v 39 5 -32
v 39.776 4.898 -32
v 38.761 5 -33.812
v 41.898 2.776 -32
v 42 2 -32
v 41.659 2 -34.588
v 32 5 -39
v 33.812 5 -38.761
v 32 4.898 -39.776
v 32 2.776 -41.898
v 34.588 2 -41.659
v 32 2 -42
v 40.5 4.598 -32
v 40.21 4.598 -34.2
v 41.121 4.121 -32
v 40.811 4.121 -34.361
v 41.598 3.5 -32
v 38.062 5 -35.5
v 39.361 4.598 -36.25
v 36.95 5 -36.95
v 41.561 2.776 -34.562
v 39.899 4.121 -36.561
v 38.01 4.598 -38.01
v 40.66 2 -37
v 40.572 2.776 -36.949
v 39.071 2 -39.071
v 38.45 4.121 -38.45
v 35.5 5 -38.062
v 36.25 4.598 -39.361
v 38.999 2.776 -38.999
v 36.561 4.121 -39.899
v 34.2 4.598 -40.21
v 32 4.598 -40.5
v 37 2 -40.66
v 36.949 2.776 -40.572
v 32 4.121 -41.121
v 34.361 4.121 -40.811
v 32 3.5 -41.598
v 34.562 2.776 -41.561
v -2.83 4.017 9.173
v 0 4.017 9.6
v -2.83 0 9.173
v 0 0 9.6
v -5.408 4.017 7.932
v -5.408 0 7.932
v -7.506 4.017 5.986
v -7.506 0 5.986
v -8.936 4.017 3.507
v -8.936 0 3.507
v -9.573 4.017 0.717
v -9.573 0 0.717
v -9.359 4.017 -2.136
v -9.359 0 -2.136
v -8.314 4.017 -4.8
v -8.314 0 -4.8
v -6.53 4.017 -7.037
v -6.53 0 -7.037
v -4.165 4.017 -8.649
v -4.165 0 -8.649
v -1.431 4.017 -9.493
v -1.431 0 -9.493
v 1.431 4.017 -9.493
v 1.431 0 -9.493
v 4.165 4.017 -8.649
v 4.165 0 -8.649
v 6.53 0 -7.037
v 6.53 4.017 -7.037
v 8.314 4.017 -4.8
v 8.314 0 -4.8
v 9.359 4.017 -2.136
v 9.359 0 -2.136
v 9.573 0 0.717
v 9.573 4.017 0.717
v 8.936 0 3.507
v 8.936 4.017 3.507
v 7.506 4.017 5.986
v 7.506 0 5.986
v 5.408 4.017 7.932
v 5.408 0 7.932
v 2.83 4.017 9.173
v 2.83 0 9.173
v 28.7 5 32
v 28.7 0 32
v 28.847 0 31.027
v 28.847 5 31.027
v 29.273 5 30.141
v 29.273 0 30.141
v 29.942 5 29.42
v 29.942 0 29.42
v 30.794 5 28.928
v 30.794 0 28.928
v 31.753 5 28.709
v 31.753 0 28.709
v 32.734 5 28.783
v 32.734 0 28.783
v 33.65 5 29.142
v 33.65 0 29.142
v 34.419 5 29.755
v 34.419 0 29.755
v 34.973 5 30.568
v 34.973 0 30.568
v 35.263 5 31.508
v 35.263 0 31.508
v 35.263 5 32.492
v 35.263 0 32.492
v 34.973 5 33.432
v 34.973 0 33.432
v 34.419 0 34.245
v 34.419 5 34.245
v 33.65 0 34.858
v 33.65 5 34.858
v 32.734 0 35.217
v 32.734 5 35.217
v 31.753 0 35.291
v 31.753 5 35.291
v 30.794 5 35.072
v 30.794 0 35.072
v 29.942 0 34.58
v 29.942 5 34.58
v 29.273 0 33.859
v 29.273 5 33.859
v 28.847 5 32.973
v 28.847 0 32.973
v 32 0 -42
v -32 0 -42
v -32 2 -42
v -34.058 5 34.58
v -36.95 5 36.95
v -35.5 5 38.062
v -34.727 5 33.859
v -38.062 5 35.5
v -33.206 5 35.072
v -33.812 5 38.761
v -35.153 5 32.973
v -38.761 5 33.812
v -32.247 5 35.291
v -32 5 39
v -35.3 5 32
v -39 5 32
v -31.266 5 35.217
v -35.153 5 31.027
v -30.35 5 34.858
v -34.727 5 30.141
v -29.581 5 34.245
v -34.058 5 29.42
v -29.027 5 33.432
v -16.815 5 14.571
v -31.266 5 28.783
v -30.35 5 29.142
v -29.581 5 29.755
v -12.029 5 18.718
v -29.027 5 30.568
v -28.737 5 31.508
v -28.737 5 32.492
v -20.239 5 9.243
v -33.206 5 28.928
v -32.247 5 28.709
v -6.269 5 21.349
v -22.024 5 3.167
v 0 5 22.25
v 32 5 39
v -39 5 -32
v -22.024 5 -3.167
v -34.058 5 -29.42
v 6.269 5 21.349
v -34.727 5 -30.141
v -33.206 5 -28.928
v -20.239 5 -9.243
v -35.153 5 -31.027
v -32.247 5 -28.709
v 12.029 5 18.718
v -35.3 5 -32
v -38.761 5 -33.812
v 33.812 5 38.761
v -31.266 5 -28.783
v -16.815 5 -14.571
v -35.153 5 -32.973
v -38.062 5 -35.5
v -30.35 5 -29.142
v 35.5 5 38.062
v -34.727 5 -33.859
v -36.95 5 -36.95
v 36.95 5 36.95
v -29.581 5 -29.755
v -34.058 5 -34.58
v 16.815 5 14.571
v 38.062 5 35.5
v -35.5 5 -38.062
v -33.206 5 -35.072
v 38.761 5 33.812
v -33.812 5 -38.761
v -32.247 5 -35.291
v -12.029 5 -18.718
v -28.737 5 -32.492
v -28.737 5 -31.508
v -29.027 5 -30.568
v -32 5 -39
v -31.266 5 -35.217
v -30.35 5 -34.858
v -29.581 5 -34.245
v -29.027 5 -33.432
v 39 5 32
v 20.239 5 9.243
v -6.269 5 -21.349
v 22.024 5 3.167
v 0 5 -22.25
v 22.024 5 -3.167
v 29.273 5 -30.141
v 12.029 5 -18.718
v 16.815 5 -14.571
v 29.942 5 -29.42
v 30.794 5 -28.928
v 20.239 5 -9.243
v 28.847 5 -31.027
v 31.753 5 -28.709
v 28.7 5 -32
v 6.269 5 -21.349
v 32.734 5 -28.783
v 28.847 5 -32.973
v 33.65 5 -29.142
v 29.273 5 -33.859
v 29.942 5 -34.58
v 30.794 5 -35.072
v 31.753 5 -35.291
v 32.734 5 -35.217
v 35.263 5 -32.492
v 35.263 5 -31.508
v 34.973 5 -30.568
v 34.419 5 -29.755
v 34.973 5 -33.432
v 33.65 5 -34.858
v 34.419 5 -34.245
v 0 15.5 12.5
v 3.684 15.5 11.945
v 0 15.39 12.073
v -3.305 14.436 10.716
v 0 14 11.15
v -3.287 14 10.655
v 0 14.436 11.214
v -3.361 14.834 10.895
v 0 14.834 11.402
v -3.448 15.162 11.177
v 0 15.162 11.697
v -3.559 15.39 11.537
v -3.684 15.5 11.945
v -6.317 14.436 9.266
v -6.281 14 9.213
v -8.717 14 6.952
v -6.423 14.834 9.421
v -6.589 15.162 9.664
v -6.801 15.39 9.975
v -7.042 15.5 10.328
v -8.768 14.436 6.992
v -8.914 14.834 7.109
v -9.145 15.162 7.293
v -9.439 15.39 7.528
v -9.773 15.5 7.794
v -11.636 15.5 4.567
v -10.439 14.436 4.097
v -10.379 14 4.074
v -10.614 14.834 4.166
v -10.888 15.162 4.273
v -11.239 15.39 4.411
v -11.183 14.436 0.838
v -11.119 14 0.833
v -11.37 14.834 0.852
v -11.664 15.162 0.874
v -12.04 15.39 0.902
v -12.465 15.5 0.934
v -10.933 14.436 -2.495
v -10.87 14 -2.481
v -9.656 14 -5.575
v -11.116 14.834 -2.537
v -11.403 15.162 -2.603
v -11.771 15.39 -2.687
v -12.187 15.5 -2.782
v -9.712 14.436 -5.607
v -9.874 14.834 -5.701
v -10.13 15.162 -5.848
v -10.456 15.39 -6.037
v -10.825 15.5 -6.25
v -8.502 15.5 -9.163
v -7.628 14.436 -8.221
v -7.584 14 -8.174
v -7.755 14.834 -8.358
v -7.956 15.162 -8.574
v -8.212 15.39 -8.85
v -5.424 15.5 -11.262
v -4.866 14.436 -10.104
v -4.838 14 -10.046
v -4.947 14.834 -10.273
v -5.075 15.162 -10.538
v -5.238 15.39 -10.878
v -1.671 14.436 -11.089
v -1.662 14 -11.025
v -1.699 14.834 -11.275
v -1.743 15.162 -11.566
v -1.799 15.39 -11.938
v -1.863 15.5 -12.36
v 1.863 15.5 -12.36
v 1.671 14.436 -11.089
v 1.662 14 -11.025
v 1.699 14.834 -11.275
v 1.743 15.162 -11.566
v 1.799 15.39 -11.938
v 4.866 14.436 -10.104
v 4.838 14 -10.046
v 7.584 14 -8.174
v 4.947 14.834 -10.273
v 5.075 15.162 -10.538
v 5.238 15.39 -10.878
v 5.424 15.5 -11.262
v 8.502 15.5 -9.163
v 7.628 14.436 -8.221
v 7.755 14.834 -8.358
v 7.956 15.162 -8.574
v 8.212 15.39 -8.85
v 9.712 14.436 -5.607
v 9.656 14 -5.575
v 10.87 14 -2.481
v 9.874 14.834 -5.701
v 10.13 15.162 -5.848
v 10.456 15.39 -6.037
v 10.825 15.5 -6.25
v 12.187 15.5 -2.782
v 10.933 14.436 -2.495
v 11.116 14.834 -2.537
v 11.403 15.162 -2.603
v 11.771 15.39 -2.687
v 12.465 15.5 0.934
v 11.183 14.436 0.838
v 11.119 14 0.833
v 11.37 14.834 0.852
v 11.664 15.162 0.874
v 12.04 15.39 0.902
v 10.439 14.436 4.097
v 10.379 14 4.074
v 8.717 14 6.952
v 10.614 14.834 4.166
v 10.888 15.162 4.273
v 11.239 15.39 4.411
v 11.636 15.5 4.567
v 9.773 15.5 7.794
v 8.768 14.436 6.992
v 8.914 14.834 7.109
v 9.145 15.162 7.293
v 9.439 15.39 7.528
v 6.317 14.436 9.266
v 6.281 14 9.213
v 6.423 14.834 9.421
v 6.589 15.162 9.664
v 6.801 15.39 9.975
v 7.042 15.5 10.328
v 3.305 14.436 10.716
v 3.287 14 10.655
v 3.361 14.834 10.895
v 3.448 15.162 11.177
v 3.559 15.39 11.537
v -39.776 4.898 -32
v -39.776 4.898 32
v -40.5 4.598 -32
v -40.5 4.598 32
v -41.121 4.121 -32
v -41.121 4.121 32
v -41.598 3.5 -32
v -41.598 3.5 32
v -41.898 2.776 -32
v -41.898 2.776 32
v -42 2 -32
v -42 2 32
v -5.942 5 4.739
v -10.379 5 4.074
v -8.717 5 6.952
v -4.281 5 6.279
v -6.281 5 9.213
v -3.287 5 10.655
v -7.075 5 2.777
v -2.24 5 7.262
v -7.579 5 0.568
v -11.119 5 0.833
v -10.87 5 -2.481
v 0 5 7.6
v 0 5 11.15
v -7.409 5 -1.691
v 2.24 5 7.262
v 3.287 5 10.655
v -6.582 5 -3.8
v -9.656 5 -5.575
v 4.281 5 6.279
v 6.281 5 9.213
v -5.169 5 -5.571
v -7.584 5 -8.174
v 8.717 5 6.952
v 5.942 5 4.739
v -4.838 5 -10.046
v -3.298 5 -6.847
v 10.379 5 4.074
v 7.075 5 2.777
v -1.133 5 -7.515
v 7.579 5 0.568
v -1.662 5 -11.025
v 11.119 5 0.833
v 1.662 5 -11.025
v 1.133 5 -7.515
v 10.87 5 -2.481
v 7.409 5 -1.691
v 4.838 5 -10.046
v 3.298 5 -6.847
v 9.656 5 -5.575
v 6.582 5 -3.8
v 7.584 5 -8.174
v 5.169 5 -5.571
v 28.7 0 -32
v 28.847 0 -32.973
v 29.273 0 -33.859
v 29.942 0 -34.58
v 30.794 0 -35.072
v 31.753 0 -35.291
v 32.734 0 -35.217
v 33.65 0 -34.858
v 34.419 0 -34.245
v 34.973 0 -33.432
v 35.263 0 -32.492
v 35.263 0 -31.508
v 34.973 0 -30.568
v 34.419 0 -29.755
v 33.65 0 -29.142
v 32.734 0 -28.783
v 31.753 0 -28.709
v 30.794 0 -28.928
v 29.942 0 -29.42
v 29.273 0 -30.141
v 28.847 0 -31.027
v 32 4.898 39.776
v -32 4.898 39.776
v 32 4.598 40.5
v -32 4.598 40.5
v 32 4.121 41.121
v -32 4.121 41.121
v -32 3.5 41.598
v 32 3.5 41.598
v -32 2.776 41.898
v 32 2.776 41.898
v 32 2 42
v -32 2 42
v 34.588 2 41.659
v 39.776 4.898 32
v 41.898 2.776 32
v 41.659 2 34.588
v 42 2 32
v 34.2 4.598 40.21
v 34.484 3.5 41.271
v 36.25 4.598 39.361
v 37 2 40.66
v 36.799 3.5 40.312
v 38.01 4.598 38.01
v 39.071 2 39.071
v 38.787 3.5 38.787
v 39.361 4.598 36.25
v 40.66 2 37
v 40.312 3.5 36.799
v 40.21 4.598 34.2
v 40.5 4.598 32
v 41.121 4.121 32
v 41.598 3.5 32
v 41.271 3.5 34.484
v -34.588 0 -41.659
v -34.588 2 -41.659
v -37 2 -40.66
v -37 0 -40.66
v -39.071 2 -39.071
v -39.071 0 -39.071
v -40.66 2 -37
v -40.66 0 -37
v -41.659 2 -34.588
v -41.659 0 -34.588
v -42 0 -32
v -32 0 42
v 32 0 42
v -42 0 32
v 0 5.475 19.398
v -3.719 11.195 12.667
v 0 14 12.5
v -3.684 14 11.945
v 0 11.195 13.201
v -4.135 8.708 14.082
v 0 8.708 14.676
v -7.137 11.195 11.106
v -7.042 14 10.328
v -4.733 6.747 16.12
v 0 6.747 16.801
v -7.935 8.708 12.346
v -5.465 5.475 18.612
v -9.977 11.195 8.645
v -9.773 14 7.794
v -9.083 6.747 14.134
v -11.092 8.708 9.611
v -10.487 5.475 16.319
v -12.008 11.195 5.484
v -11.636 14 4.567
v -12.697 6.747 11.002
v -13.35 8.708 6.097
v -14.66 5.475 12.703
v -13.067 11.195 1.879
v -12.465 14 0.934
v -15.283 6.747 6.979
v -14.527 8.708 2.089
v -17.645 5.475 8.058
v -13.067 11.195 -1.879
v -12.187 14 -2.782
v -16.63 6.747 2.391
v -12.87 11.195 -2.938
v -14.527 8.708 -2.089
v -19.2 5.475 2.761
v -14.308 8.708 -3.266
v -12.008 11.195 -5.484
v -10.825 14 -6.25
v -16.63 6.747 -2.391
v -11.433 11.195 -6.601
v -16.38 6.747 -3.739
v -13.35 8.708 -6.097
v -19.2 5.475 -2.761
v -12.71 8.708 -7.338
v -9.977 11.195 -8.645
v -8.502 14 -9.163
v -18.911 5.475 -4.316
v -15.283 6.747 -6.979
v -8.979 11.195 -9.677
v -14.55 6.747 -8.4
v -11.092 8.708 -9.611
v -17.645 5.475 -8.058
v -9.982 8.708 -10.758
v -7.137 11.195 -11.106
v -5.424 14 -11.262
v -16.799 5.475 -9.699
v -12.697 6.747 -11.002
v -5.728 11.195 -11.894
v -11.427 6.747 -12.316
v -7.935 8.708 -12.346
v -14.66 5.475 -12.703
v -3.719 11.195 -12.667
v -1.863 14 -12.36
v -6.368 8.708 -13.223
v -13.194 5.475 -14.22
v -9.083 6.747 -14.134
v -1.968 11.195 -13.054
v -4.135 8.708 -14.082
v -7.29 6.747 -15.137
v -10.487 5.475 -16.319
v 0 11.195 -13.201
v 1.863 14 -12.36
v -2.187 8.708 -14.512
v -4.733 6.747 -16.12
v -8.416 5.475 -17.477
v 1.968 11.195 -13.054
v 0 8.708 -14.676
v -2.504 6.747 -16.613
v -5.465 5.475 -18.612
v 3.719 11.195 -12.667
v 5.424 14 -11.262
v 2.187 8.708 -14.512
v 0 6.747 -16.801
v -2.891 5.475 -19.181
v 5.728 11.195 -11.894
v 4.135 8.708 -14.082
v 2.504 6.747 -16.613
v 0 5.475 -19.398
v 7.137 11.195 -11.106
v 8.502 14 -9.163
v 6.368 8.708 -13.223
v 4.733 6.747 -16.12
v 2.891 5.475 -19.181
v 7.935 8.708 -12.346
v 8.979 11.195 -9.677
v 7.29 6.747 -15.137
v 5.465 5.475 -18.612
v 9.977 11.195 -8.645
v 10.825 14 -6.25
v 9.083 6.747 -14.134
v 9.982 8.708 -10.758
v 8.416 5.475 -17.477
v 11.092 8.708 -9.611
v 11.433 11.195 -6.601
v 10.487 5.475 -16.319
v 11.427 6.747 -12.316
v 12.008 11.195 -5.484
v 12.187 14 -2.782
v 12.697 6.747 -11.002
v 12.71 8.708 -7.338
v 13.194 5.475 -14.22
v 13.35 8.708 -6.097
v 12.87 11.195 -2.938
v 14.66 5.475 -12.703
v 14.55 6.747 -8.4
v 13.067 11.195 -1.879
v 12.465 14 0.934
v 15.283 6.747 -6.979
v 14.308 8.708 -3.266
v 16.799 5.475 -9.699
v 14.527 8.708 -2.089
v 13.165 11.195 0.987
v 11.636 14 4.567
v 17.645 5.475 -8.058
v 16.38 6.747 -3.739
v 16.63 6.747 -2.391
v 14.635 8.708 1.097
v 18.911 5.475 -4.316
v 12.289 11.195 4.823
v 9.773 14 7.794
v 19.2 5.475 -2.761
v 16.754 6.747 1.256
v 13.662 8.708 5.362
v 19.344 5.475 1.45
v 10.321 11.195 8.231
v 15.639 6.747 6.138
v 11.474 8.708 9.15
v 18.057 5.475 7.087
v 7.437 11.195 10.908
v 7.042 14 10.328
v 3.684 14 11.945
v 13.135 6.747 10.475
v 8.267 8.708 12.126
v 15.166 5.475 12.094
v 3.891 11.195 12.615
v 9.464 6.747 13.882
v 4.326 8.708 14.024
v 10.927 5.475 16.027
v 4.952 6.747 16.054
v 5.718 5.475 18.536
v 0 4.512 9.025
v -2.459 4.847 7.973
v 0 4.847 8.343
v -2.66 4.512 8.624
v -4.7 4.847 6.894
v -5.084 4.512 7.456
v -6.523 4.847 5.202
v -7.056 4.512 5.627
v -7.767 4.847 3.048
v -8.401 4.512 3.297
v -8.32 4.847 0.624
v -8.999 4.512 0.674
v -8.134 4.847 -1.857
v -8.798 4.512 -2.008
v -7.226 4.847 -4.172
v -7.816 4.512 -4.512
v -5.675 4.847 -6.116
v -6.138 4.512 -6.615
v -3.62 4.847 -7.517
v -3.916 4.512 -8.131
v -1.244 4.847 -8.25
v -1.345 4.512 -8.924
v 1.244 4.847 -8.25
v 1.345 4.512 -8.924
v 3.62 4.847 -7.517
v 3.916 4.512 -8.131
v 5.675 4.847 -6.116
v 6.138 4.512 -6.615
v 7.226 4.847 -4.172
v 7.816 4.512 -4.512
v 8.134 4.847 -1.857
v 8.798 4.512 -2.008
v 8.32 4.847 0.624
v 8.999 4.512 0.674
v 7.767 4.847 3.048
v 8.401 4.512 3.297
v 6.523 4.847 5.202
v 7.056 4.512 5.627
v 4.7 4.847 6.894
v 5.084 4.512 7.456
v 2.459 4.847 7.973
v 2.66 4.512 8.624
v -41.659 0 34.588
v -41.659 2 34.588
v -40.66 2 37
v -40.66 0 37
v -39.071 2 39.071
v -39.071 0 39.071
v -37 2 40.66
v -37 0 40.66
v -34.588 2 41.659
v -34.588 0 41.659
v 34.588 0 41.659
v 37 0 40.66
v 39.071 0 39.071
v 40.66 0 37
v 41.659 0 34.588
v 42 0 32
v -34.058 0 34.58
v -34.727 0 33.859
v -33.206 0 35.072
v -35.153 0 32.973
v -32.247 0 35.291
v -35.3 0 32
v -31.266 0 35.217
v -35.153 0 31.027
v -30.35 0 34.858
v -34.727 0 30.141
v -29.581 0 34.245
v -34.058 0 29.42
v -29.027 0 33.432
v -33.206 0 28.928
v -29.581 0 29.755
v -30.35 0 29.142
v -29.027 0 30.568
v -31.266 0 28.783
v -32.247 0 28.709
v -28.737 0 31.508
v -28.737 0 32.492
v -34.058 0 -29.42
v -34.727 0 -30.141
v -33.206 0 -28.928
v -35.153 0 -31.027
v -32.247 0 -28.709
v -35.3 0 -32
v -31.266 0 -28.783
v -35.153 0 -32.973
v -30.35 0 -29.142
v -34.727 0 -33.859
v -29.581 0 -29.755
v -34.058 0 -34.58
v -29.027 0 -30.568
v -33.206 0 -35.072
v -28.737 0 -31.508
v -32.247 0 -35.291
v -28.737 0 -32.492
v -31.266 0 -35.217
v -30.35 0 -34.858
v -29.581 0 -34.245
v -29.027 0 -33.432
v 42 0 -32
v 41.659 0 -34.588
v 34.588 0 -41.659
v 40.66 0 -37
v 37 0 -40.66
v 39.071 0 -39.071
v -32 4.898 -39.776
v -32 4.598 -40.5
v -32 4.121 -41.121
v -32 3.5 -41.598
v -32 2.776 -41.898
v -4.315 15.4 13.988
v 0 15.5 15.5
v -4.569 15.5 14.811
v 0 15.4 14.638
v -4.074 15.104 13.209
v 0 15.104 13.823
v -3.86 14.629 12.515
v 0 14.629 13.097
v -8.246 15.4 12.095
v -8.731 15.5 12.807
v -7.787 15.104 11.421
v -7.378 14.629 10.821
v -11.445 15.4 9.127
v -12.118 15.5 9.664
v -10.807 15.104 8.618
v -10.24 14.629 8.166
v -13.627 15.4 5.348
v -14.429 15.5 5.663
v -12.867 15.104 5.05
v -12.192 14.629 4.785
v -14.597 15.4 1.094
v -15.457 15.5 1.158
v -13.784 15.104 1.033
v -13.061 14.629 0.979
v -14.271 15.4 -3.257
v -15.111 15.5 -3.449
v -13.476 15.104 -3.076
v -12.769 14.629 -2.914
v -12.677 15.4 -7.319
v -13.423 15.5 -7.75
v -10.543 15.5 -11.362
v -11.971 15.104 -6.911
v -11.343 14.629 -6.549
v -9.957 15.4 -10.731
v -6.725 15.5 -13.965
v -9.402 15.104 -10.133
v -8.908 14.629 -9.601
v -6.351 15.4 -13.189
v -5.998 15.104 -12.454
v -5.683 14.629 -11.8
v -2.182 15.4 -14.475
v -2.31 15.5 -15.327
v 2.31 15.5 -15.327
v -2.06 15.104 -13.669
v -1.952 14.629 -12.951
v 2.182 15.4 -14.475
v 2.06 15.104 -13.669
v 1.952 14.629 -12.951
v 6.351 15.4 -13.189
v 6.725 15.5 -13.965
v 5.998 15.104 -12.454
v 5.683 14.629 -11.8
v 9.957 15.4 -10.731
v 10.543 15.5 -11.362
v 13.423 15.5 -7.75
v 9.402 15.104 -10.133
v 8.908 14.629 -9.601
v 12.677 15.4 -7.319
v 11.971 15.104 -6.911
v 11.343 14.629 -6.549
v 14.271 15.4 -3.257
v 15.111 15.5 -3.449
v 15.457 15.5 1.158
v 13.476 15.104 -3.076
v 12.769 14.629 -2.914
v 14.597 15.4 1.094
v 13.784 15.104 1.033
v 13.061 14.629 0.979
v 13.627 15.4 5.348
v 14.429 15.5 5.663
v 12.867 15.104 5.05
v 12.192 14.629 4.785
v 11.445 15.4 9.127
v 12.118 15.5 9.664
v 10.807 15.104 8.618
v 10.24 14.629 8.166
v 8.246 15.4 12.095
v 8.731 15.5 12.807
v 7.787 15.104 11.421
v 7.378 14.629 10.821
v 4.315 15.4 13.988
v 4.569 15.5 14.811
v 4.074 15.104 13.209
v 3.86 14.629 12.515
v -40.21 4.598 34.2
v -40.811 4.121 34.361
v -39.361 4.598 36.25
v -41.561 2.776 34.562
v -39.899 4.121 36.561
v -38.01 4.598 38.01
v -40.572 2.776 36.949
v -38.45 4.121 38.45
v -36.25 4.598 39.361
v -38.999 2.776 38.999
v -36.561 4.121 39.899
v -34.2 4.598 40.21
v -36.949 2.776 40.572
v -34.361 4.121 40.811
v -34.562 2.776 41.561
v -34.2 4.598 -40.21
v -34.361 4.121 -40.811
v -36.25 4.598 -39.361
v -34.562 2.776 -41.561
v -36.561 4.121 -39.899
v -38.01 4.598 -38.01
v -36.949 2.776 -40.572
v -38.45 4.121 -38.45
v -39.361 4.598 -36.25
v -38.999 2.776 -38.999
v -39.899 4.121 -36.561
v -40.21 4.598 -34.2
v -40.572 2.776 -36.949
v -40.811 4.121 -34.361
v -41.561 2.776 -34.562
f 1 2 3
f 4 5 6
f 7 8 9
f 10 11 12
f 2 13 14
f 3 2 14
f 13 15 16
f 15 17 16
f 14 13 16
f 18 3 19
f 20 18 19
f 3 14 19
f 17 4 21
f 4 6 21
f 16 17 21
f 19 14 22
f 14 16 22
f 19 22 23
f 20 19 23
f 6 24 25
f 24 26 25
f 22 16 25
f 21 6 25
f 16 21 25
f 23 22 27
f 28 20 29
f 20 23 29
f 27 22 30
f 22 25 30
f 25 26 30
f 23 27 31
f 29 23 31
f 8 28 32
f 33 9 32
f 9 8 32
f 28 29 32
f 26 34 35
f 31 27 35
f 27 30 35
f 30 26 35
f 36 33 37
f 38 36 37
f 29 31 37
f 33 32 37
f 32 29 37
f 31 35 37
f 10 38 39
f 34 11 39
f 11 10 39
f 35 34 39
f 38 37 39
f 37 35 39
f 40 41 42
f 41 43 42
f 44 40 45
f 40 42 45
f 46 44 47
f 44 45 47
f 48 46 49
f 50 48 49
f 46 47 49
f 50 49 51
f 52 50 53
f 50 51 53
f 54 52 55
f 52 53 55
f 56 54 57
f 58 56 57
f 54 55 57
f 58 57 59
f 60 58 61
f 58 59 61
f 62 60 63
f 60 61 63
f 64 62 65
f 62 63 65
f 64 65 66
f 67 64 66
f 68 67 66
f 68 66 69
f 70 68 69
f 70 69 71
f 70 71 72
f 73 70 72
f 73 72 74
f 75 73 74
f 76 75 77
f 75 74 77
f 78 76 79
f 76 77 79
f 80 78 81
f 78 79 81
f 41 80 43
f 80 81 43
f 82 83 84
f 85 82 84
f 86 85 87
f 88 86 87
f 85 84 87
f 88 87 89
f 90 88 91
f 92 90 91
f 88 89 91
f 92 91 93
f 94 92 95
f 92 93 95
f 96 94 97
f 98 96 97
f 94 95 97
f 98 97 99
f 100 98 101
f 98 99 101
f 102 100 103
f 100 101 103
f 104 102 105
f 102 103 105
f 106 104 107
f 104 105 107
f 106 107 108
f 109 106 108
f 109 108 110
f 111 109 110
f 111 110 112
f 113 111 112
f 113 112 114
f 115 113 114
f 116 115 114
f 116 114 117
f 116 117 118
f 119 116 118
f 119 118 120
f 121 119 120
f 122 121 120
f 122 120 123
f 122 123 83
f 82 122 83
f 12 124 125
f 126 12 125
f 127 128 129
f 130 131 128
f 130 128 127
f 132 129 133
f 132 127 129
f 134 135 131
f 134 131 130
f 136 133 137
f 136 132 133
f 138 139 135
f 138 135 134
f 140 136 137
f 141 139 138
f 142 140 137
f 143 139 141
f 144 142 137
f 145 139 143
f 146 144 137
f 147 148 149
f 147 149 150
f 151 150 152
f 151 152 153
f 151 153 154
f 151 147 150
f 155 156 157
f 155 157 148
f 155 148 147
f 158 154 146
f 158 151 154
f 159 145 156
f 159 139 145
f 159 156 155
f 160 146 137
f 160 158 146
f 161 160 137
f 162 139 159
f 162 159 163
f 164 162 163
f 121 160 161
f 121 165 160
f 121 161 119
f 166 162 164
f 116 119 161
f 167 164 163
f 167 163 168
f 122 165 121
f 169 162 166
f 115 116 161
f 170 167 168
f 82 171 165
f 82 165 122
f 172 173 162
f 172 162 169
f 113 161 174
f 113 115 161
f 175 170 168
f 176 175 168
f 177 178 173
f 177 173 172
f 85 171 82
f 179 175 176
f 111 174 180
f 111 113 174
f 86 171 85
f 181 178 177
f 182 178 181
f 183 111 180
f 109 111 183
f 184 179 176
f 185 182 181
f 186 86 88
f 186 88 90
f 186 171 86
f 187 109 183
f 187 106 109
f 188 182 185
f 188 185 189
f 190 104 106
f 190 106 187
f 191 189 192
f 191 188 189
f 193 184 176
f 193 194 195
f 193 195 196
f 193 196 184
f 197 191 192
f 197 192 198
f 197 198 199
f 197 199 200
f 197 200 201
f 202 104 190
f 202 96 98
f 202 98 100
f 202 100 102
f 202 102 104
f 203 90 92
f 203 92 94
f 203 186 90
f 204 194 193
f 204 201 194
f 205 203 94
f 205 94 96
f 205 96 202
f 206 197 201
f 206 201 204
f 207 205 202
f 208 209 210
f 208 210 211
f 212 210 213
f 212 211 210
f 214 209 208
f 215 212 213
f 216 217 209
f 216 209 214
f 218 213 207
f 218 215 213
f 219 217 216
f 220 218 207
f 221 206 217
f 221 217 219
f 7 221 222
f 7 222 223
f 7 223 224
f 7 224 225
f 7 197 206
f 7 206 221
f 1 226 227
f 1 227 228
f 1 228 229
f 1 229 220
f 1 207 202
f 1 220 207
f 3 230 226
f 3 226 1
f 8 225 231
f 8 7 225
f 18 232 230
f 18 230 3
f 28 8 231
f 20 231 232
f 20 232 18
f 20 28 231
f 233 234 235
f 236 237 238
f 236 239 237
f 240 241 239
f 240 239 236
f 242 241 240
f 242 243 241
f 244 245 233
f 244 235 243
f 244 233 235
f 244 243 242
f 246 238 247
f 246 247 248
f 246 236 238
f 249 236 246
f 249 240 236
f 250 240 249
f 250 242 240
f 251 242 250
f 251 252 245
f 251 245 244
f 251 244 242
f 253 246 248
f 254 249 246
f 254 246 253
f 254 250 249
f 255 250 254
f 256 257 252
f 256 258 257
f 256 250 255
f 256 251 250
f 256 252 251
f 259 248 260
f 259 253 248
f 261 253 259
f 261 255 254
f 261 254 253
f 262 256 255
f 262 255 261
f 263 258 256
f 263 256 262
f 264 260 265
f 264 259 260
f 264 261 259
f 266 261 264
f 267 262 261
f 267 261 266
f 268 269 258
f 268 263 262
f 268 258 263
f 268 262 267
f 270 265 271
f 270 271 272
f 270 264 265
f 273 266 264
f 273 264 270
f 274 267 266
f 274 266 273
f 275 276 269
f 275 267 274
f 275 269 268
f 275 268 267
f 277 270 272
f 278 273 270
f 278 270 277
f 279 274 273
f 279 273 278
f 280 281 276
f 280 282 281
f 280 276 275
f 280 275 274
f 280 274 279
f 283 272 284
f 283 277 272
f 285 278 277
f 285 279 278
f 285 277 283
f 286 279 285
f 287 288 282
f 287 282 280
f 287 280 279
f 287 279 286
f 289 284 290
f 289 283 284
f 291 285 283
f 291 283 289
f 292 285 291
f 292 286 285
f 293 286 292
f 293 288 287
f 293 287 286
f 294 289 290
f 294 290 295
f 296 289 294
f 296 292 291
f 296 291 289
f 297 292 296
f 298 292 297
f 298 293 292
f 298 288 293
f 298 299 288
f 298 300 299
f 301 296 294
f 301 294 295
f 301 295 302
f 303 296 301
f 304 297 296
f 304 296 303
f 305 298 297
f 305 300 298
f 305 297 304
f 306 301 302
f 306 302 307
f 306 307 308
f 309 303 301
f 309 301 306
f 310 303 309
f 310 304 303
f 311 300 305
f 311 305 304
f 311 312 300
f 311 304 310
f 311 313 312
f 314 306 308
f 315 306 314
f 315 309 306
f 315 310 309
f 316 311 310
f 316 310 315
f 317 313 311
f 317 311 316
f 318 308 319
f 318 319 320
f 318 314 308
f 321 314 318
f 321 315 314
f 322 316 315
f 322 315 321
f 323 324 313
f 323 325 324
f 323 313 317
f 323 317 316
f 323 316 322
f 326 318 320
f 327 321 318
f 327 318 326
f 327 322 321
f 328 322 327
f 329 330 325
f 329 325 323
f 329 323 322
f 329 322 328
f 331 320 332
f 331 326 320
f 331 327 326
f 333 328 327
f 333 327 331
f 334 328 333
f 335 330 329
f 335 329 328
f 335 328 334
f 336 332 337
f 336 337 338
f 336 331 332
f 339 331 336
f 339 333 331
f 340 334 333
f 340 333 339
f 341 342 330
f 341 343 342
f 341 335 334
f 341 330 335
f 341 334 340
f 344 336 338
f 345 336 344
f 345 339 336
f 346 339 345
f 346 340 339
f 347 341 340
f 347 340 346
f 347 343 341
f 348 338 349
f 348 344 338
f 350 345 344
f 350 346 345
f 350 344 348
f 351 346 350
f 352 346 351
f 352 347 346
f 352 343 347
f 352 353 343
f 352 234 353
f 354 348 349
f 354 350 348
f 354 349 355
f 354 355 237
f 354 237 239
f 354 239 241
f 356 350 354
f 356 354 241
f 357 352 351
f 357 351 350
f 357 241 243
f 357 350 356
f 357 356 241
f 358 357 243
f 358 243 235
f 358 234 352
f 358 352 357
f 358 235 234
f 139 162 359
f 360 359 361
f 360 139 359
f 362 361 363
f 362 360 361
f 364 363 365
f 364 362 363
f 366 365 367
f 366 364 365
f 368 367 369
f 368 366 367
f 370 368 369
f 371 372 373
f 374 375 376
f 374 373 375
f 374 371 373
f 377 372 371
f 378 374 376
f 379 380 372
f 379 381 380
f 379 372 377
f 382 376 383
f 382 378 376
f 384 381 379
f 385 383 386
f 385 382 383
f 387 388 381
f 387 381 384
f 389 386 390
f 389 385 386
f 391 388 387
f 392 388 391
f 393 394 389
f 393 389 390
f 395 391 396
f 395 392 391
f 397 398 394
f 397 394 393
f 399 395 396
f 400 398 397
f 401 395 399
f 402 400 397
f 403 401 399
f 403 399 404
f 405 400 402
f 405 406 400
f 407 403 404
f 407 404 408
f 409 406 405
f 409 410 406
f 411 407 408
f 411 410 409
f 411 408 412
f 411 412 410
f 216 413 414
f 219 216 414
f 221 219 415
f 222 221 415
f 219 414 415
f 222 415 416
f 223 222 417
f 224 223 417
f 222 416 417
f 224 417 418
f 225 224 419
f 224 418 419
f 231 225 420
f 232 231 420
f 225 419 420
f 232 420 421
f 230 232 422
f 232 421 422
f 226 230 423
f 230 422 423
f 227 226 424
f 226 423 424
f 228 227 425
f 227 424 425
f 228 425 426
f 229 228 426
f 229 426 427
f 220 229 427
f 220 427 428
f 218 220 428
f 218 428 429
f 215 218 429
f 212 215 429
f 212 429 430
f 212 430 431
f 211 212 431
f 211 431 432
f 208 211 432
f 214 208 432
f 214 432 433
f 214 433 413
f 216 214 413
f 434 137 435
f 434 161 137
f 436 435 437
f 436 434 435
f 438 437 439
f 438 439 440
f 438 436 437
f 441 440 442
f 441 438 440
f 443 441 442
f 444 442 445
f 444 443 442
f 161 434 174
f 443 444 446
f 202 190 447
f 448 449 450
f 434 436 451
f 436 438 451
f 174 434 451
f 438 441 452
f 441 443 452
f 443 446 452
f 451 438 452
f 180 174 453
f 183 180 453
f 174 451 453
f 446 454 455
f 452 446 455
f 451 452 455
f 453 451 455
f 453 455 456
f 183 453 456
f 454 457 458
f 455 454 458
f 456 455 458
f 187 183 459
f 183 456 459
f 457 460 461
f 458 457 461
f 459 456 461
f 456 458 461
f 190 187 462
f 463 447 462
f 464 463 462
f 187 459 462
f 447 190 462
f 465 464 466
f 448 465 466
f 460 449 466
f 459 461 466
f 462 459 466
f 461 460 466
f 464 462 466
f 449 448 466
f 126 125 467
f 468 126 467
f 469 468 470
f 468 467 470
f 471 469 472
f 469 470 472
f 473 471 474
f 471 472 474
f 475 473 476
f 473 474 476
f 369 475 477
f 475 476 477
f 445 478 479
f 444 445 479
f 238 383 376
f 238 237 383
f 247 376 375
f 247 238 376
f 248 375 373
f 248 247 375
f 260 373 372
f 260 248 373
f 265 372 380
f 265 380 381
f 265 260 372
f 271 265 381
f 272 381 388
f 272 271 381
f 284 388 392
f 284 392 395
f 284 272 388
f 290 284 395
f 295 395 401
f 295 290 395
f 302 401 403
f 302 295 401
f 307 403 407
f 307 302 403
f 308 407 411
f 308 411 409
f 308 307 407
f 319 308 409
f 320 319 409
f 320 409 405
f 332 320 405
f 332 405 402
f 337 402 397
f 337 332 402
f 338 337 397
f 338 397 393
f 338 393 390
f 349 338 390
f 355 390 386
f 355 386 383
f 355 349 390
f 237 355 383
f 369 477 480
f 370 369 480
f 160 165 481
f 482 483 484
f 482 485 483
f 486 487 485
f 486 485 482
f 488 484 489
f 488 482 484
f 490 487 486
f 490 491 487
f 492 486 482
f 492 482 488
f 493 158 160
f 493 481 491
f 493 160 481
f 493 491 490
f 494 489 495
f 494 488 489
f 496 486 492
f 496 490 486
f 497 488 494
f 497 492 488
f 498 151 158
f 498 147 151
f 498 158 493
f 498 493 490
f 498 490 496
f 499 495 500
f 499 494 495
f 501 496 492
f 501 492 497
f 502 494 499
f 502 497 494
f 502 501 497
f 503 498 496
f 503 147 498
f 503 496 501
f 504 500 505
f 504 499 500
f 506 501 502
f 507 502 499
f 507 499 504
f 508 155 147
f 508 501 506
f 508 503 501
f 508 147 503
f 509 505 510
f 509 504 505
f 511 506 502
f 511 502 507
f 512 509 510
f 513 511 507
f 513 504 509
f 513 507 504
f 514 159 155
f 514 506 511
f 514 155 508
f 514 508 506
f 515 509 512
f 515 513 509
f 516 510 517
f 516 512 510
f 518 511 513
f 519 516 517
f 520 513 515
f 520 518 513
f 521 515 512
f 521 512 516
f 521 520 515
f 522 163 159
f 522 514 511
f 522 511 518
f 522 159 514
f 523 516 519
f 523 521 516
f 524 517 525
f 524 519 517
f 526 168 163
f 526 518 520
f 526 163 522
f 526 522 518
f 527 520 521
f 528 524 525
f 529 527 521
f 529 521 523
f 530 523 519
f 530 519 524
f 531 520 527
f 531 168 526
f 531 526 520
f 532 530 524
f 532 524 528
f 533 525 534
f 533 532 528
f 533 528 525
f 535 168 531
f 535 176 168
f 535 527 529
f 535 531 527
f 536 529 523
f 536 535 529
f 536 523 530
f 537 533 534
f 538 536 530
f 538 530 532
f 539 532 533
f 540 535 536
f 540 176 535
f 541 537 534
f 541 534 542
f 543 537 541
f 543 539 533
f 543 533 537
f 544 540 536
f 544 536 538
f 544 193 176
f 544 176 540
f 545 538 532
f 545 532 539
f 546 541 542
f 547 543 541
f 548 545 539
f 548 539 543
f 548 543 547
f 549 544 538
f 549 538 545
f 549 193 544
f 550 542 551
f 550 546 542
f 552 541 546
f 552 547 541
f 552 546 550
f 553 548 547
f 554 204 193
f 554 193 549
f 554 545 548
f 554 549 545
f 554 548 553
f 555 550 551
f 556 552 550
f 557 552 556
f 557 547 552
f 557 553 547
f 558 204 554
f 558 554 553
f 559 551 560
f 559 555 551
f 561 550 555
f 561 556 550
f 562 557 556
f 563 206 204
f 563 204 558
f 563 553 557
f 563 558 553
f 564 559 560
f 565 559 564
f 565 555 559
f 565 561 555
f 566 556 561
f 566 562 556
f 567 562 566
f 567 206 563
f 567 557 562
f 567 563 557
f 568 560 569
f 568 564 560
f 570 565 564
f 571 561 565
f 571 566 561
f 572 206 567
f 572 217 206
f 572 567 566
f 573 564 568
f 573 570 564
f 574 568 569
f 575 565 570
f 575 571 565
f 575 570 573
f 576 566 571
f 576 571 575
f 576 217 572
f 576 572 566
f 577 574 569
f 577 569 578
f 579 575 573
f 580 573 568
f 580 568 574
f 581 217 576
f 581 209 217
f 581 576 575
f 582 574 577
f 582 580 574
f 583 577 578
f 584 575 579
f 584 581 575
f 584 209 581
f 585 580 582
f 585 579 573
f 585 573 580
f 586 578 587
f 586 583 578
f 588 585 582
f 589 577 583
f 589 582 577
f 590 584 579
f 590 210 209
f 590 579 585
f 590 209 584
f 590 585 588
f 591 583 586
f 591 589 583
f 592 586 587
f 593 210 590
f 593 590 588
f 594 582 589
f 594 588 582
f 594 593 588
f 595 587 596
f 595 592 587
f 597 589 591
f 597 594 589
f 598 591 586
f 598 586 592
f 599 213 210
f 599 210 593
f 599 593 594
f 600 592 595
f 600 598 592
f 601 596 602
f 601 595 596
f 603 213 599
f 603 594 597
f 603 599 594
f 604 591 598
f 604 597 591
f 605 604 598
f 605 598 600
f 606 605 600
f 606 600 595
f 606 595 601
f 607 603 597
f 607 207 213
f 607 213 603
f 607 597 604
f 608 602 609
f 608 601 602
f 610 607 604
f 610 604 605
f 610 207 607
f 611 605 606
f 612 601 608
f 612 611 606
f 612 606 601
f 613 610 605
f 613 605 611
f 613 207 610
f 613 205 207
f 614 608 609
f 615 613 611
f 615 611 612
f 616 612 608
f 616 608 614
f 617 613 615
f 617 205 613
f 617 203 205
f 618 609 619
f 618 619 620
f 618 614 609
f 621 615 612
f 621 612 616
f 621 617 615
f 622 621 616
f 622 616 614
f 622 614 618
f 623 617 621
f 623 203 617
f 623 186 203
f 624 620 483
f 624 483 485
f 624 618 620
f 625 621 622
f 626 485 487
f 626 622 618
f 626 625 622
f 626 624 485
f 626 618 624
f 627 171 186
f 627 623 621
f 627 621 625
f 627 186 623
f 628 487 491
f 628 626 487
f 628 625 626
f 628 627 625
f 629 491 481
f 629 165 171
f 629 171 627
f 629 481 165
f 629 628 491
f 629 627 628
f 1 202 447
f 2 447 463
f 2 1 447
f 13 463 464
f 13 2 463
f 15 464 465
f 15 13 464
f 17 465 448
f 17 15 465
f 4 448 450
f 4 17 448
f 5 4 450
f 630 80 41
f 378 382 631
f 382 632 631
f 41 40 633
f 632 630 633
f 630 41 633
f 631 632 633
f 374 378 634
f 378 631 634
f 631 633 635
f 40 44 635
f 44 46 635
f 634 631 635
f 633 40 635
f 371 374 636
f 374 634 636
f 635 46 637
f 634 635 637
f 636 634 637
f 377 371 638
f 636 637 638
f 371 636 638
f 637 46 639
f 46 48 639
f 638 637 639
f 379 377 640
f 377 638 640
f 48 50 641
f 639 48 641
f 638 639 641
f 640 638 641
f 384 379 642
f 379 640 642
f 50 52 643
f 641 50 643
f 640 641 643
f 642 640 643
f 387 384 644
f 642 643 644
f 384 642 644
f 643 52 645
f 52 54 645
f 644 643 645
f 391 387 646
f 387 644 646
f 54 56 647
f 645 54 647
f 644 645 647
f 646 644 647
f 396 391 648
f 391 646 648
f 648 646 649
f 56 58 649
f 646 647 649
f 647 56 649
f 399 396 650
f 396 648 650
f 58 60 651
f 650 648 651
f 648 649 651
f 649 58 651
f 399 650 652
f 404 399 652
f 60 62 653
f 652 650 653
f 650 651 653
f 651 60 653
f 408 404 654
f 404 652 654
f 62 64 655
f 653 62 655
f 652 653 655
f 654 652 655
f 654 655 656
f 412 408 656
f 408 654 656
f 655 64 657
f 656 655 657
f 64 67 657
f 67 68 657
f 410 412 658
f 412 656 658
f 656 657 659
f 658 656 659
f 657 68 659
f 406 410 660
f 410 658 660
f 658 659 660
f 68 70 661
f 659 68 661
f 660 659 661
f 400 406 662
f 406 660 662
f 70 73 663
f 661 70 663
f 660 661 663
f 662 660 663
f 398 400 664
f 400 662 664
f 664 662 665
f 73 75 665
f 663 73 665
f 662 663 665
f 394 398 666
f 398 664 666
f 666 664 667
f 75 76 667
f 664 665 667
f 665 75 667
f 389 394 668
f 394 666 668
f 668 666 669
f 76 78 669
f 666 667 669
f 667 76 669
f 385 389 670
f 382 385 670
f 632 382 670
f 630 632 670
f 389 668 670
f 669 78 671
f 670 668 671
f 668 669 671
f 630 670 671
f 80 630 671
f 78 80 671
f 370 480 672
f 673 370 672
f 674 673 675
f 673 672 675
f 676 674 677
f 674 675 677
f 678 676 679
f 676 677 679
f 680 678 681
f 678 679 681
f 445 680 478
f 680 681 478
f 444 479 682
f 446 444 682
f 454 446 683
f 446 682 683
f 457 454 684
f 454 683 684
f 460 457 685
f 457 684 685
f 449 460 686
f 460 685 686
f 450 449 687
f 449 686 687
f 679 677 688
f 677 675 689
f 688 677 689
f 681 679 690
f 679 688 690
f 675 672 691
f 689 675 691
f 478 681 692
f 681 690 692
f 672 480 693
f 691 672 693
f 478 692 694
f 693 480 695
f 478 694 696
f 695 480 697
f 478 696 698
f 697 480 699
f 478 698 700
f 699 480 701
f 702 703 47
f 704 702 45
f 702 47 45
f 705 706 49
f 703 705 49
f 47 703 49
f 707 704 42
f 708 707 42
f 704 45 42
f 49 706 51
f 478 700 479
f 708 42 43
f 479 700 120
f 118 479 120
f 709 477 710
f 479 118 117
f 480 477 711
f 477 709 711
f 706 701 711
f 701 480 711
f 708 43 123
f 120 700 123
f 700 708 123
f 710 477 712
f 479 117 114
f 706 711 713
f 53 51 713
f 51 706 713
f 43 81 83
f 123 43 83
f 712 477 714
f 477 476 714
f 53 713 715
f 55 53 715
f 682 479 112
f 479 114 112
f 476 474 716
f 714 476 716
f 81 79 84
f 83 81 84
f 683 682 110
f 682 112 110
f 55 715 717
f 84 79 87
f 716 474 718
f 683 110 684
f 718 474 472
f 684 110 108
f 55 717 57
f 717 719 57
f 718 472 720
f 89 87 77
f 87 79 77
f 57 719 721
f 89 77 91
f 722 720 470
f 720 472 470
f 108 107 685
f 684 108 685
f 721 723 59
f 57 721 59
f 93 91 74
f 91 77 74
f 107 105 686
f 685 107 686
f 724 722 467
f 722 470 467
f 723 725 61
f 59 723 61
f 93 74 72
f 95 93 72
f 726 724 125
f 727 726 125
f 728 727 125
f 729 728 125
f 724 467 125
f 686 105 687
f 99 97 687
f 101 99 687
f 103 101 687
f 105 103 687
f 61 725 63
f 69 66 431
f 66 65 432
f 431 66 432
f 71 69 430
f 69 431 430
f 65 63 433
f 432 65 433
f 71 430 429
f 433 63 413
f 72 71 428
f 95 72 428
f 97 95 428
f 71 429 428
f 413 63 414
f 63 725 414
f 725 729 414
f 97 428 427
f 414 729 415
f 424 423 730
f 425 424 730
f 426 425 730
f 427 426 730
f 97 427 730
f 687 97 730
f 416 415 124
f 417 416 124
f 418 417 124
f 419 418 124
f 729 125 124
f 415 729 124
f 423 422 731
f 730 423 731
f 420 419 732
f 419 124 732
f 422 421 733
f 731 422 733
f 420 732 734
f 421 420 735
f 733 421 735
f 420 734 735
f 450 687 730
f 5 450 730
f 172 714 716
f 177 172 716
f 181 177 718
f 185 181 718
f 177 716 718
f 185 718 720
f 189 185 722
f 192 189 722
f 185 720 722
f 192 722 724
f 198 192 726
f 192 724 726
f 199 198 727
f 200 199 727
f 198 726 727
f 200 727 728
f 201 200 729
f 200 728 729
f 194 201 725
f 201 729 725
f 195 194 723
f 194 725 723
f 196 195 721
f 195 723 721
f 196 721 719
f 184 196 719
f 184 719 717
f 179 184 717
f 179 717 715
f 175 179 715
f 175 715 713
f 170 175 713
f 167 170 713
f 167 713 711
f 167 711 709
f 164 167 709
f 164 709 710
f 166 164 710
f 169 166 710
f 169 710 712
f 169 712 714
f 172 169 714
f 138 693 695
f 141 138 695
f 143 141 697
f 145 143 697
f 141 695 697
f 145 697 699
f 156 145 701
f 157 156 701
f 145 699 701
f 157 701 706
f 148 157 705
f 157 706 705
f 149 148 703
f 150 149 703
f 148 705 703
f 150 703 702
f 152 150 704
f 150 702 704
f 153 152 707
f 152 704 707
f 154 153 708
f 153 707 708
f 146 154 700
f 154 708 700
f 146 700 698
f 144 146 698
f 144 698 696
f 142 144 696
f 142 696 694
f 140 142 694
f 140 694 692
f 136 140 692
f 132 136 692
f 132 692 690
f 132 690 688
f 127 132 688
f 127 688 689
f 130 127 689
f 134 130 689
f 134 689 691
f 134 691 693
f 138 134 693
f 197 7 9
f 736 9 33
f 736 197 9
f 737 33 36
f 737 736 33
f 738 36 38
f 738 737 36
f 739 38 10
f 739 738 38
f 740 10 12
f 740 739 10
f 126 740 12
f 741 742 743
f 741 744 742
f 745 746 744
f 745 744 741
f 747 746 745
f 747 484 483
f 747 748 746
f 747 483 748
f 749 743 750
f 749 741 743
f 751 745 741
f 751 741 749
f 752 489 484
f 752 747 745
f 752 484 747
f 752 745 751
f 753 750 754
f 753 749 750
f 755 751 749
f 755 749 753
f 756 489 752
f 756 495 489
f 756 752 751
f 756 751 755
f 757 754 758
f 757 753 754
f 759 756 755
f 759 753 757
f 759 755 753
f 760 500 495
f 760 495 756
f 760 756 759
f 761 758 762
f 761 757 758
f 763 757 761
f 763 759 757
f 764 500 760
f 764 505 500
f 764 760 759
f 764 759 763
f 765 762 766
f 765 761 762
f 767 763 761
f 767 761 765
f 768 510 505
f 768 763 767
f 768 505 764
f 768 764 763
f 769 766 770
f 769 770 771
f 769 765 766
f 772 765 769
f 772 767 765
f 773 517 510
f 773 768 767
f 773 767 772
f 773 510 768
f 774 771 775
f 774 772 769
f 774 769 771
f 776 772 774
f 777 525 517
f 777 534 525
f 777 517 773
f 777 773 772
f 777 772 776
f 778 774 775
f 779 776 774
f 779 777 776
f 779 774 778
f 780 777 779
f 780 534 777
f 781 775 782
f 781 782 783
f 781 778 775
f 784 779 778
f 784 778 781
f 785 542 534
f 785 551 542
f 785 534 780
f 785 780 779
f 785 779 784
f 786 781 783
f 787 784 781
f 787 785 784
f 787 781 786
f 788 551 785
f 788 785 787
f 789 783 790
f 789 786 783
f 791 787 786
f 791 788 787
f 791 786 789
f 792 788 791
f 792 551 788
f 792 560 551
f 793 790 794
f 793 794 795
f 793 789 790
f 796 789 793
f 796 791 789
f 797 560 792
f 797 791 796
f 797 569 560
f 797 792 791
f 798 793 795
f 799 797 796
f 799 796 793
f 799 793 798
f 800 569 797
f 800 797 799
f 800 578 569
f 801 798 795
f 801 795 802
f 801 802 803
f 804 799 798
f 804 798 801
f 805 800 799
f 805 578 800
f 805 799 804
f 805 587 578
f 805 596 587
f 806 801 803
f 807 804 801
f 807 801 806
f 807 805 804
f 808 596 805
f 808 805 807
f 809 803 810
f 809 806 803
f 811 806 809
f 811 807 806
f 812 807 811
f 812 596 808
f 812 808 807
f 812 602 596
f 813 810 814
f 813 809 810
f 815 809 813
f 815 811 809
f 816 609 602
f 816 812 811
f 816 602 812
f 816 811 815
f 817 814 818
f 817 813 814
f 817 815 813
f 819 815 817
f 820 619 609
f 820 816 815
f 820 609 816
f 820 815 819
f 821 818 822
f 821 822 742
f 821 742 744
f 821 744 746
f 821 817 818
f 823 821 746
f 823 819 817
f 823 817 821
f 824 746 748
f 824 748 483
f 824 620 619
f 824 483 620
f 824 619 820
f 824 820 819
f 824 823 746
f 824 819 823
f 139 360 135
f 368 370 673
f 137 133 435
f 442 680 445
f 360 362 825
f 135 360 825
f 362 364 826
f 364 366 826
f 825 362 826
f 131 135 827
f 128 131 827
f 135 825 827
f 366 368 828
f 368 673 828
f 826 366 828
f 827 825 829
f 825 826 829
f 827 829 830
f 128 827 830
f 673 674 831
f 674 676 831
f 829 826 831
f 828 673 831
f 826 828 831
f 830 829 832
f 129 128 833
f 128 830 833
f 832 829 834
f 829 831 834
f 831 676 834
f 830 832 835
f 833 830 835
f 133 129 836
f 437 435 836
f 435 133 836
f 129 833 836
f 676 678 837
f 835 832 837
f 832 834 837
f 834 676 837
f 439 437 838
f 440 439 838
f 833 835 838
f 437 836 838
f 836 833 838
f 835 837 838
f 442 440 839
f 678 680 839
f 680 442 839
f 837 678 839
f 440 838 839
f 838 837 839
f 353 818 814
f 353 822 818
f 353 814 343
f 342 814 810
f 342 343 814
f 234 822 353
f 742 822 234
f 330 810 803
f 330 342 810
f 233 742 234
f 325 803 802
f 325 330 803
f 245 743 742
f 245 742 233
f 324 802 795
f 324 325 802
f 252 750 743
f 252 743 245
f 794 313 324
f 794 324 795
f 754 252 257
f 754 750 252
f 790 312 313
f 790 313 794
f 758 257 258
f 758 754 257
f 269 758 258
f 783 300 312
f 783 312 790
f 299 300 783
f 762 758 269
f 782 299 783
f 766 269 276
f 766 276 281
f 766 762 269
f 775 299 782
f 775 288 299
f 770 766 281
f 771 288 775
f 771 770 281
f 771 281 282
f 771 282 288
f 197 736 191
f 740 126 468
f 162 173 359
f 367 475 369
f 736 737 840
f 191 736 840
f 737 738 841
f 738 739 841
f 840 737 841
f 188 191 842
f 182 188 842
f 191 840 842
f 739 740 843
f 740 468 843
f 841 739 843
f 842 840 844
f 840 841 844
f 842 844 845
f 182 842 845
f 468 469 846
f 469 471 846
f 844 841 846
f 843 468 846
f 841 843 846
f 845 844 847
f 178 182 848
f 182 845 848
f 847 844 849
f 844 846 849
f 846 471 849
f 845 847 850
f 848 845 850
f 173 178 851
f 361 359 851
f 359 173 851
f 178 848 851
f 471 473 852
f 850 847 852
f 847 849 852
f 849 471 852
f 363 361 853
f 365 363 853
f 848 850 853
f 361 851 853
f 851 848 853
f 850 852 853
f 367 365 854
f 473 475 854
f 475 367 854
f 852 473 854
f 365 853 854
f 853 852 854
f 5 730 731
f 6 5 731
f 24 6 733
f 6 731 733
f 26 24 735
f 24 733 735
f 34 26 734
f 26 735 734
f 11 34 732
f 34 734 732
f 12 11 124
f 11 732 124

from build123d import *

# Parameters (mm, degrees)
BOSS_EXTRUDE1_DEPTH      = 5
FILLET1_R                = 3
M6_CLEARANCE_HOLE1_D     = 6.6
M6_CLEARANCE_HOLE1_DEPTH = 8
M6_CLEARANCE_HOLE1_TIP   = 1.982840043


with BuildPart() as part:
    # Sketch1 → Boss-Extrude1 (new body)
    with BuildSketch(Plane(origin=(0, 0, 0), x_dir=(1, 0, 0), z_dir=(0, 1, 0))):
        with BuildLine():
            Line((32, 42), (-32, 42))
            ThreePointArc((-32, 42), (-39.071067812, 39.071067812), (-42, 32))
            Line((-42, 32), (-42, -32))
            ThreePointArc((-42, -32), (-39.071067812, -39.071067812), (-32, -42))
            Line((-32, -42), (32, -42))
            ThreePointArc((32, -42), (39.071067812, -39.071067812), (42, -32))
            Line((42, -32), (42, 32))
            ThreePointArc((42, 32), (39.071067812, 39.071067812), (32, 42))
        make_face()
    extrude(amount=BOSS_EXTRUDE1_DEPTH)

    # Sketch3 → Revolve2 (revolve)
    with BuildSketch(Plane.XY):
        with BuildLine():
            Line((-22.25, 5), (-11.15, 5))
            Line((-11.15, 5), (-11.15, 14))
            ThreePointArc((-11.15, 14), (-11.537197996, 15.009021804), (-12.5, 15.5))
            Line((-12.5, 15.5), (-15.5, 15.5))
            ThreePointArc((-15.5, 15.5), (-13.822949017, 15.104101966), (-12.5, 14))
            ThreePointArc((-12.5, 14), (-15.66727432, 7.649963846), (-22.25, 5))
        make_face()
    revolve(axis=Axis((0, 0, 0), (0, -1, 0)))

    # Sketch3<5> → Cut-Revolve2 (revolve, cut)
    with BuildSketch(Plane.XY):
        with BuildLine():
            Line((0, 0), (0, 5))
            Line((0, 5), (-7.6, 5))
            ThreePointArc((-7.6, 5), (-8.694616444, 4.701278719), (-9.6, 4.017392631))
            Line((-9.6, 4.017392631), (-9.6, 0))
            Line((-9.6, 0), (0, 0))
        make_face()
    revolve(axis=Axis((0, 0, 0), (0, -1, 0)), mode=Mode.SUBTRACT)

    # Fillet1
    fillet1_edges = [part.edges().sort_by_distance(p)[0] for p in [
        (42, 5, 0),
        (39.071067812, 5, -39.071067812),
        (0, 5, -42),
        (-39.071067812, 5, -39.071067812),
        (-42, 5, 0),
        (-39.071067812, 5, 39.071067812),
        (0, 5, 42),
        (39.071067812, 5, 39.071067812),
    ]]
    fillet(fillet1_edges, radius=FILLET1_R)

    # M6 Clearance Hole1
    with Locations(Plane(origin=(0, 5, 0), x_dir=(1, 0, 0), z_dir=(0, 1, 0))):
        with Locations((-32, 32), (-32, -32), (32, -32), (32, 32)):
            Hole(M6_CLEARANCE_HOLE1_D / 2, depth=M6_CLEARANCE_HOLE1_DEPTH)
            with Locations((0, 0, -(M6_CLEARANCE_HOLE1_DEPTH + M6_CLEARANCE_HOLE1_TIP / 2))):  # 118° drill point
                Cone(0, M6_CLEARANCE_HOLE1_D / 2, M6_CLEARANCE_HOLE1_TIP, mode=Mode.SUBTRACT)


solid = part.part
